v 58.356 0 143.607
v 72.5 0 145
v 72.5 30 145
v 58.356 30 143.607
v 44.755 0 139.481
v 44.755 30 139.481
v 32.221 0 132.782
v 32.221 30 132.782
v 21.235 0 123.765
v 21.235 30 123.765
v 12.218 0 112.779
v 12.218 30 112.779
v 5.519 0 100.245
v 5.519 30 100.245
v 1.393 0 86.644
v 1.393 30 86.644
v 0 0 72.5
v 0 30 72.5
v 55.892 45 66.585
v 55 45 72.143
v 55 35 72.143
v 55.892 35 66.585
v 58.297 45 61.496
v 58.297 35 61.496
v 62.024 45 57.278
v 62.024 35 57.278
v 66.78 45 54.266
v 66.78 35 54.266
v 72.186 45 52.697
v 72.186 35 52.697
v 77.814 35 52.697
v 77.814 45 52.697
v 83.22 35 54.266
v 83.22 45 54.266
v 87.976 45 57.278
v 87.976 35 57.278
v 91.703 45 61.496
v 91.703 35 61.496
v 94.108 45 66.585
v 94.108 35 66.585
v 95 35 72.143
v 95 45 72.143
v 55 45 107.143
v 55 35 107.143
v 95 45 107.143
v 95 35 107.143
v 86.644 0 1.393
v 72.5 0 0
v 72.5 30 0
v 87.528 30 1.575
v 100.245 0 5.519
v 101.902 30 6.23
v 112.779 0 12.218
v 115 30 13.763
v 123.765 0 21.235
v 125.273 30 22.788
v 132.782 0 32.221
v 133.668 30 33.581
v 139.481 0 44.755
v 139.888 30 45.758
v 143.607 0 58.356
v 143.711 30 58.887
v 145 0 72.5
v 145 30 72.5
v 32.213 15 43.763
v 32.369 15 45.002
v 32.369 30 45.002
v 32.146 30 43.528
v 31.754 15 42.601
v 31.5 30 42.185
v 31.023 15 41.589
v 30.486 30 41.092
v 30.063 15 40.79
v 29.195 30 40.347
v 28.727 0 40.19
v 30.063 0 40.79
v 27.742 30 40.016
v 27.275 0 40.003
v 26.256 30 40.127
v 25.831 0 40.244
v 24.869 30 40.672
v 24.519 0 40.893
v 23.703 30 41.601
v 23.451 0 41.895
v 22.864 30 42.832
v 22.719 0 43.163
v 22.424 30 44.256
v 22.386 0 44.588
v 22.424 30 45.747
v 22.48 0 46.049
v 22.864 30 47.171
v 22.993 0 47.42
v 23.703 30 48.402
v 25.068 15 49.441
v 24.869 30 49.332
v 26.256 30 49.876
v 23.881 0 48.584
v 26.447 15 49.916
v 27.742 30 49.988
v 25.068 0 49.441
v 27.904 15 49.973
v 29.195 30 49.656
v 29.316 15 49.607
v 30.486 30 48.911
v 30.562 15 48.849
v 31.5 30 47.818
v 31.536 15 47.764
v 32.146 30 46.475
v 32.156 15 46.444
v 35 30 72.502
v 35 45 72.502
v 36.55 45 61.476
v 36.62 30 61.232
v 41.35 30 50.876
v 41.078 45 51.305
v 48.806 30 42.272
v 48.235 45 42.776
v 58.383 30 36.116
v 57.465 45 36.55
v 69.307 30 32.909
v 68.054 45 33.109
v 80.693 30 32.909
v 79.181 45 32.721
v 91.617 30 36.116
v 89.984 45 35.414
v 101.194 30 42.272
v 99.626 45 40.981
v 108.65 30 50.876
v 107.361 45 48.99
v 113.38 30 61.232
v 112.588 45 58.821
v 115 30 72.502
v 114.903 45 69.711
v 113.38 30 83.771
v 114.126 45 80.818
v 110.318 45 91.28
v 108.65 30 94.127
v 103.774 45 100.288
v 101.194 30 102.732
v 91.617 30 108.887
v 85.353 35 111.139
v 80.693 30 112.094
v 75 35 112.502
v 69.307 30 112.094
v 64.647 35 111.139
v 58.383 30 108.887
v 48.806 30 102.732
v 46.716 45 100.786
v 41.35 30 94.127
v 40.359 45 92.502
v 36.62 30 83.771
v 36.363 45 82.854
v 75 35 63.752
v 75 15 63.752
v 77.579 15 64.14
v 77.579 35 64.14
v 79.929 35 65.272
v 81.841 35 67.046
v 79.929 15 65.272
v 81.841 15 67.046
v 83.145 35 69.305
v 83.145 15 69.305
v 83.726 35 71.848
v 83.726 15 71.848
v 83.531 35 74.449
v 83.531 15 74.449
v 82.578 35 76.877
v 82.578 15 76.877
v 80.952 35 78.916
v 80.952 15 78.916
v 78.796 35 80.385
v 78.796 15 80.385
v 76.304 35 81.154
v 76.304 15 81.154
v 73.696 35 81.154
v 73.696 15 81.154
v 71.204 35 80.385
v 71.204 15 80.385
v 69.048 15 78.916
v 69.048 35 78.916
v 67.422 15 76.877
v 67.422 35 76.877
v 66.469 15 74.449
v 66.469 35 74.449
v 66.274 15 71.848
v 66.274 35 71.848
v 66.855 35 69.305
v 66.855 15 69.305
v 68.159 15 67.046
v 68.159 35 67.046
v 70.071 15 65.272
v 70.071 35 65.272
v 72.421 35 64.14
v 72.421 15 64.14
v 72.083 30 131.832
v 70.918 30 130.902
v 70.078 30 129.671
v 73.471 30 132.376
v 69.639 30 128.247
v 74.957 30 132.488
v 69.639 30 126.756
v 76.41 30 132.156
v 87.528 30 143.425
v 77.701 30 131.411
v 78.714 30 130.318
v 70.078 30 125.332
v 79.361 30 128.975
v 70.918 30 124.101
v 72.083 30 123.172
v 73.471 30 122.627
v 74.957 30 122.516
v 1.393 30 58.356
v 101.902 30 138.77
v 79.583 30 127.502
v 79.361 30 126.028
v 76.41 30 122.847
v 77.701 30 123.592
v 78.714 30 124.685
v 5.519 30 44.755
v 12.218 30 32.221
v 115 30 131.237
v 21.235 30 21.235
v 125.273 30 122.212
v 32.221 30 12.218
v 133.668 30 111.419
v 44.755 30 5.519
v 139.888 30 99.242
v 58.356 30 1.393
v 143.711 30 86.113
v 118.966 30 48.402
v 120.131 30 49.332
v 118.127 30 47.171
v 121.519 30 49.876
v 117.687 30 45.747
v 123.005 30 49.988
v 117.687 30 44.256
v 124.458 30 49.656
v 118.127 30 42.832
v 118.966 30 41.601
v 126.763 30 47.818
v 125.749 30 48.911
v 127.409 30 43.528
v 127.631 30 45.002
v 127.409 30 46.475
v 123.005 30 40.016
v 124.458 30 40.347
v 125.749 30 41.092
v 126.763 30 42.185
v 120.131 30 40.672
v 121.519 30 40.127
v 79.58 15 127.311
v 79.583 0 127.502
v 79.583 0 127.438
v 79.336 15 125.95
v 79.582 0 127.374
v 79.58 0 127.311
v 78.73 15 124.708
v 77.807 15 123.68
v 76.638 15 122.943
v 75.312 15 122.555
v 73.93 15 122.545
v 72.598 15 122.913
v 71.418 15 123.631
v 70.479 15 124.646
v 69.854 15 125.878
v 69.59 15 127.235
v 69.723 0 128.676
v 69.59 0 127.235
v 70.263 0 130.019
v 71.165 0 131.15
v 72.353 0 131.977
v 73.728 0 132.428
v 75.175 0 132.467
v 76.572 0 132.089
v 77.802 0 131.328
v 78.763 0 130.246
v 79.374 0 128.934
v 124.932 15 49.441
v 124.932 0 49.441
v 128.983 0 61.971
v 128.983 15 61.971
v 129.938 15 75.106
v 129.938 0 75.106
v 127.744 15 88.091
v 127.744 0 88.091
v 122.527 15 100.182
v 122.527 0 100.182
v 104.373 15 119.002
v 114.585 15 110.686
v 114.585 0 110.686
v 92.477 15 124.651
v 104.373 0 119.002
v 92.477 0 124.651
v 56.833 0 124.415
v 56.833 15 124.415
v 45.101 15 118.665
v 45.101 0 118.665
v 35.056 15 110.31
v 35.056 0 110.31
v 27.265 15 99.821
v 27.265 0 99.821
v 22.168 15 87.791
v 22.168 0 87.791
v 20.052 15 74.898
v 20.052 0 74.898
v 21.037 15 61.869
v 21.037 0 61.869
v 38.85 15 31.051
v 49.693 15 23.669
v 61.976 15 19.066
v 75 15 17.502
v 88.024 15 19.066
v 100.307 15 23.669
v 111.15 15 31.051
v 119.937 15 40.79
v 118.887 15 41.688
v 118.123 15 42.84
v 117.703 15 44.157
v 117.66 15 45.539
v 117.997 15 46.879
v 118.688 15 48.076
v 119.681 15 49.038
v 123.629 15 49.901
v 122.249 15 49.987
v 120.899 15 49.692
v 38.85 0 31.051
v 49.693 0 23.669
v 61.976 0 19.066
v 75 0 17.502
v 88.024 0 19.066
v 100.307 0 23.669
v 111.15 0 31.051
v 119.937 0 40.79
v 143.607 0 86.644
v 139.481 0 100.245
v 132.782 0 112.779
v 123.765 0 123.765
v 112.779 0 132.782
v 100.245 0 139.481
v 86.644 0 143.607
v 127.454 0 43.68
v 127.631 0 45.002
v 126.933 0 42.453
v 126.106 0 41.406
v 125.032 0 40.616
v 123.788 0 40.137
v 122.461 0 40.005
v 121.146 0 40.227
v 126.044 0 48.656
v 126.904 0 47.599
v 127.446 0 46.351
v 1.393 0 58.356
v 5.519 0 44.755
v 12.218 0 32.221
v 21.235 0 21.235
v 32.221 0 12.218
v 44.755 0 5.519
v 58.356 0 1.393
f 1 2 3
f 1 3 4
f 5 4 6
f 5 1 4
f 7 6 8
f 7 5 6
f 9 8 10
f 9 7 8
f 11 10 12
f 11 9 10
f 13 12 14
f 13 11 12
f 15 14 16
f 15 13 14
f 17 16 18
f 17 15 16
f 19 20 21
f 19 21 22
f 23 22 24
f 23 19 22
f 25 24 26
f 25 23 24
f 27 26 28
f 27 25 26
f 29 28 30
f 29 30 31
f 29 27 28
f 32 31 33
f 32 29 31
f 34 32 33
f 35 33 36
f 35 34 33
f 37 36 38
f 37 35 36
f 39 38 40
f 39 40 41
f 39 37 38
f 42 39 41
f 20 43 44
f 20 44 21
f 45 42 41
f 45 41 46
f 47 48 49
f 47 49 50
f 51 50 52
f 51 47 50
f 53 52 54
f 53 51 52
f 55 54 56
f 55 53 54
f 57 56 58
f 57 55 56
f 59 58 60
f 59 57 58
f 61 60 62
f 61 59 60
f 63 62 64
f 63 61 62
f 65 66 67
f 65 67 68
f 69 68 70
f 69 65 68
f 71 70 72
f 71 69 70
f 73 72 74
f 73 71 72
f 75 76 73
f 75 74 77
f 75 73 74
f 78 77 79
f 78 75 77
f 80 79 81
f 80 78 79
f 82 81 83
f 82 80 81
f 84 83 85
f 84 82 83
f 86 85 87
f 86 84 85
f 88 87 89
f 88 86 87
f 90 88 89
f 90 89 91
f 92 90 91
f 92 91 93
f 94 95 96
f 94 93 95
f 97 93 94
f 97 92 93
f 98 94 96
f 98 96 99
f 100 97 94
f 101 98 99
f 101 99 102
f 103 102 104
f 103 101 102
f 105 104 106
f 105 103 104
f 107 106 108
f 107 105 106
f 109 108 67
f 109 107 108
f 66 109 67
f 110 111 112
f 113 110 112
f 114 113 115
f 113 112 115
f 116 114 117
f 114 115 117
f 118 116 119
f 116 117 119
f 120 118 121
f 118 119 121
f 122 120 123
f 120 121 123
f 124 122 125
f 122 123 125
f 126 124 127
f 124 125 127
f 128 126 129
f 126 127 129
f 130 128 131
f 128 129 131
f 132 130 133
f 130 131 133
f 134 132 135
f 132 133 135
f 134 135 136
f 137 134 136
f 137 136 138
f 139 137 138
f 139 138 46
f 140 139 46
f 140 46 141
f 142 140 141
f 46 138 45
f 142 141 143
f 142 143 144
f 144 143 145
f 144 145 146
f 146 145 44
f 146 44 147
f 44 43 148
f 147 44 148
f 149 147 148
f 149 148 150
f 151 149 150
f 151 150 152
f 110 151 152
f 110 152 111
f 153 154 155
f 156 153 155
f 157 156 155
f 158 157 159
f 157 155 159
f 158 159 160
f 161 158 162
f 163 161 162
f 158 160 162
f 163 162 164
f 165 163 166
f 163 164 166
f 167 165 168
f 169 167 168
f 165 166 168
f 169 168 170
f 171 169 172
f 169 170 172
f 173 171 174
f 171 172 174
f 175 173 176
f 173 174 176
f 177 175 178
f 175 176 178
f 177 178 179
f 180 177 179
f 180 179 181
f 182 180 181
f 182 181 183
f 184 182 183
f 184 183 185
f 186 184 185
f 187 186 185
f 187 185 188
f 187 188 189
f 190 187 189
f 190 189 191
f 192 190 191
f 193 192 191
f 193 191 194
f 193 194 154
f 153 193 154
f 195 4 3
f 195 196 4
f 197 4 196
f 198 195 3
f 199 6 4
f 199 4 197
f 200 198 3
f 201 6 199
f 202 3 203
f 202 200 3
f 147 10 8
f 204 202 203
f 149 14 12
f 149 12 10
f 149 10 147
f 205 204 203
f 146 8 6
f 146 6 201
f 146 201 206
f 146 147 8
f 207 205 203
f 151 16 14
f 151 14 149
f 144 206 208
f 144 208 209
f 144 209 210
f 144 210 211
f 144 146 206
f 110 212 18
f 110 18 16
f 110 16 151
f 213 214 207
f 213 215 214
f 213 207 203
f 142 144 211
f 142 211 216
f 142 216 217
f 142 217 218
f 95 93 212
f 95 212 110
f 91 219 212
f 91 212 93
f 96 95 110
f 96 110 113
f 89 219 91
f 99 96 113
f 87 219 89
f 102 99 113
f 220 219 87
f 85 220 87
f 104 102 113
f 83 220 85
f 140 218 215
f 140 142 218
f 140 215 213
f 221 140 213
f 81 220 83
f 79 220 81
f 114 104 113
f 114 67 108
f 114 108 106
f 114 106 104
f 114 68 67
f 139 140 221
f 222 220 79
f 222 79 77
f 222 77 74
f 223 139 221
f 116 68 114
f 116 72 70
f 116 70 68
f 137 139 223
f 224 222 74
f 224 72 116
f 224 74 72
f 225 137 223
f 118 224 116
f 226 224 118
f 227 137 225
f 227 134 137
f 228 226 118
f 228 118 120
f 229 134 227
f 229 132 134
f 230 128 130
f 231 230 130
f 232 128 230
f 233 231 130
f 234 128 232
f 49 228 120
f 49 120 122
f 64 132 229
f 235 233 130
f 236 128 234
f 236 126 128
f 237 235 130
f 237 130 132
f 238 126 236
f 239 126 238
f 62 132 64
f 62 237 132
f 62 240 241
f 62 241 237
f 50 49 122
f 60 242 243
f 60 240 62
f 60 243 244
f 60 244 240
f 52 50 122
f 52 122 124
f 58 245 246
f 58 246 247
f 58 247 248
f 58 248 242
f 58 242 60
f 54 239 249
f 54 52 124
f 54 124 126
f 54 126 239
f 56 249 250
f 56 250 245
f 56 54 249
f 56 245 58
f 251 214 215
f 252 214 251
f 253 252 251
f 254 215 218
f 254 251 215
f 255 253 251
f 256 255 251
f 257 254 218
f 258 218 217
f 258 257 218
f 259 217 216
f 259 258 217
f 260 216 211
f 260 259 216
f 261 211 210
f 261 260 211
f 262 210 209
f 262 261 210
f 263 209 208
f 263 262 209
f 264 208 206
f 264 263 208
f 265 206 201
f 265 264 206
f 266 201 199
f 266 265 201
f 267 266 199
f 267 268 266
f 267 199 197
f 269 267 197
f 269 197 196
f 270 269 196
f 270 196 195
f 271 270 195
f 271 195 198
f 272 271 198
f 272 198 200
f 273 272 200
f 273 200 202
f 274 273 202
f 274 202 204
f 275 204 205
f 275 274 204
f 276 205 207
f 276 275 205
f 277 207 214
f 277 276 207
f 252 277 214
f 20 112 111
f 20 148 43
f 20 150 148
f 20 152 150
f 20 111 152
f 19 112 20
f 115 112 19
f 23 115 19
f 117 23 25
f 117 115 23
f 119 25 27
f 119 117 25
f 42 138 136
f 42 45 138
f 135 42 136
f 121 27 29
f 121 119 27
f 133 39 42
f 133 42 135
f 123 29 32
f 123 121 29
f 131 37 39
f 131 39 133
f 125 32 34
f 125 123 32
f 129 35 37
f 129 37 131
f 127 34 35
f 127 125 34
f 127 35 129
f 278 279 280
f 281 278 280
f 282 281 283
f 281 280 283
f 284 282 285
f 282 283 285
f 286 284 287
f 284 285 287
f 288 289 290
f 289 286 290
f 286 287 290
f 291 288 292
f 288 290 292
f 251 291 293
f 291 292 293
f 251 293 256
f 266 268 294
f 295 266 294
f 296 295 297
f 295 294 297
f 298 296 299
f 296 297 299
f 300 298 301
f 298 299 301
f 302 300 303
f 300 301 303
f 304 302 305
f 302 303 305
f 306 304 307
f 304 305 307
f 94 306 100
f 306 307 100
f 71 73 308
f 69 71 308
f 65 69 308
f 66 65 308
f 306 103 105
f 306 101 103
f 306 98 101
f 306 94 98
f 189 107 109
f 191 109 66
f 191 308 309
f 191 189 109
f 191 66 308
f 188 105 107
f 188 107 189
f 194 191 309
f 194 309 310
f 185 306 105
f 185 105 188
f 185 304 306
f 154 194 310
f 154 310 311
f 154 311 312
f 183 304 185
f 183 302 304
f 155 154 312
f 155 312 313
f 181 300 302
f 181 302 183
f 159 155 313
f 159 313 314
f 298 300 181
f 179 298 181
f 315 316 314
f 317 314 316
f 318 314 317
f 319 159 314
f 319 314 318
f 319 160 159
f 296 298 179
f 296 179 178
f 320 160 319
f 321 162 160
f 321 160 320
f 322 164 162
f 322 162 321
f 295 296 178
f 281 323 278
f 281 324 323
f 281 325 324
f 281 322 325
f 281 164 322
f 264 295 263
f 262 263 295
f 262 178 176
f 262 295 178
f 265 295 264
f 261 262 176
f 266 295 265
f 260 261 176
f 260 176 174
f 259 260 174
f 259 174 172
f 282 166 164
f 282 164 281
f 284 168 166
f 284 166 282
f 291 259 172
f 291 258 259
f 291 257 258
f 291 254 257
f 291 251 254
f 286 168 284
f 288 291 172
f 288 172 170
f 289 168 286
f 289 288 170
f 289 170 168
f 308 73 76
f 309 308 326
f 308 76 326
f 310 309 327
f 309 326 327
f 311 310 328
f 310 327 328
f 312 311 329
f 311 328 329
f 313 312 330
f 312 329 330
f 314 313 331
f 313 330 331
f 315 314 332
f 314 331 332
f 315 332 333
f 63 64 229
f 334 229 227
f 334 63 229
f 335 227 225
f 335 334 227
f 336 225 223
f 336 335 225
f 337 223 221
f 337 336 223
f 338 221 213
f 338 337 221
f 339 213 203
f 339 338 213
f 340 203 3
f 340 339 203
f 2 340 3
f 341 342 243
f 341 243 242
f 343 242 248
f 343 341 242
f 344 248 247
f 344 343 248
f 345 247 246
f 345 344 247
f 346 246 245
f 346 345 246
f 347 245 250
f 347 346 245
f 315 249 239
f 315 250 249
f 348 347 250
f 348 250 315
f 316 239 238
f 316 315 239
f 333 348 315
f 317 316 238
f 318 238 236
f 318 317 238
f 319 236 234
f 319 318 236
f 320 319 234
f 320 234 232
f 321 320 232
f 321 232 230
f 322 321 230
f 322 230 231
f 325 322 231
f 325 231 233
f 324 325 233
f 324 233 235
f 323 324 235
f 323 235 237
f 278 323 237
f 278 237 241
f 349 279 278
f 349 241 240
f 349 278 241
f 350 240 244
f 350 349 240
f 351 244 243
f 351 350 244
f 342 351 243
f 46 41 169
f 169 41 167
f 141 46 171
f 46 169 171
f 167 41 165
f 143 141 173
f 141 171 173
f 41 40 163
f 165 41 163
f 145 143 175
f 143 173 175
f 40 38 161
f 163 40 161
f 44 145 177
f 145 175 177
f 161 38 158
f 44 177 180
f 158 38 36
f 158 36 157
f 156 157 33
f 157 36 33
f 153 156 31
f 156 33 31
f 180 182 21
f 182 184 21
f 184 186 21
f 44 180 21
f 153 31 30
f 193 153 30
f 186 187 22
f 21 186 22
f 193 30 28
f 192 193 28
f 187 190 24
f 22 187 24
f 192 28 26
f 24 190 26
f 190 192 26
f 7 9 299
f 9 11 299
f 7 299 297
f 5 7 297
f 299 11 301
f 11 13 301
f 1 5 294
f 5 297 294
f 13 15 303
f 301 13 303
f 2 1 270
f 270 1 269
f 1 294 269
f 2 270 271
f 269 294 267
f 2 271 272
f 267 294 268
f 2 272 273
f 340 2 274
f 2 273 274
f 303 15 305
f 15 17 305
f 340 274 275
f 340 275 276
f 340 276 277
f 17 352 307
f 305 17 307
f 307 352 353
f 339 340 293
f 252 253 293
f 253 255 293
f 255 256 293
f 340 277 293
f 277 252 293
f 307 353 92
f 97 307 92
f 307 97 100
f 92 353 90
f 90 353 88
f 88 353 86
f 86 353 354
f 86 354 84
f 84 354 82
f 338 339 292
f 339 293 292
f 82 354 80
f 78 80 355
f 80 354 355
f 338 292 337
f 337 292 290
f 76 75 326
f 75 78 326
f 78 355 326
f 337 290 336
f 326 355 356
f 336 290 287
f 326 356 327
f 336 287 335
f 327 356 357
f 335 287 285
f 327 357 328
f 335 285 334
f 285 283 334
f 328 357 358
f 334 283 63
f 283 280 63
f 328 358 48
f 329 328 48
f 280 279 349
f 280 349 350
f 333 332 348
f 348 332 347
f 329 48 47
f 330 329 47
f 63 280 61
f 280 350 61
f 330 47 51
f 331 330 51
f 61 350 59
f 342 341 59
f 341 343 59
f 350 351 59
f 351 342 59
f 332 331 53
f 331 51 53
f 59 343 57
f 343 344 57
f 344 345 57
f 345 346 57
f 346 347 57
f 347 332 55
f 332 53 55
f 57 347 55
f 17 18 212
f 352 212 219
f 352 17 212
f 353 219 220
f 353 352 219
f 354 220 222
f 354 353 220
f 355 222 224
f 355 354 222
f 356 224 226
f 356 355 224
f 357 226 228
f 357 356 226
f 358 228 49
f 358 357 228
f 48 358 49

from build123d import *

# Parameters (mm, degrees)
SKETCH1_W              = 150
SKETCH1_H              = 30
SKETCH1_W_2            = 80
SKETCH1_H_2            = 15
BOSS_EXTRUDE1_DEPTH    = 145
CUT_EXTRUDE1_DEPTH     = 145
CUT_EXTRUDE2_DEPTH     = 15
CUT_EXTRUDE3_DEPTH     = 10
M20_TAPPED_HOLE1_D     = 17.5
M20_TAPPED_HOLE1_DEPTH = 40
M20_TAPPED_HOLE1_TIP   = 5.257530416
SKETCH7_R              = 5
CUT_EXTRUDE4_DEPTH     = 83
SKETCH8_R              = 55
CUT_EXTRUDE5_DEPTH     = 15


with BuildPart() as part:
    # Sketch1 → Boss-Extrude1 (new body)
    with BuildSketch(Plane.XY):
        with Locations((75, 15)):
            Rectangle(SKETCH1_W, SKETCH1_H)
        with Locations((75, 37.5)):
            Rectangle(SKETCH1_W_2, SKETCH1_H_2)
    extrude(amount=BOSS_EXTRUDE1_DEPTH)

    # Sketch2 → Cut-Extrude1 (cut)
    with BuildSketch(Plane(origin=(0, 0, 0), x_dir=(1, 0, 0), z_dir=(0, 1, 0))):
        with BuildLine():
            Line((72.5, 0), (0, 0))
            Line((0, 0), (0, -72.5))
            ThreePointArc((0, -72.5), (21.234758364, -21.234758364), (72.5, 0))
        make_face()
        with BuildLine():
            ThreePointArc((72.5, -145), (21.234758364, -123.765241636), (0, -72.5))
            Line((0, -72.5), (0, -145))
            Line((0, -145), (72.5, -145))
        make_face()
        with BuildLine():
            Line((150, 0), (72.5, 0))
            ThreePointArc((72.5, 0), (123.765241636, -21.234758364), (145, -72.5))
            ThreePointArc((145, -72.5), (123.765241636, -123.765241636), (72.5, -145))
            Line((72.5, -145), (150, -145))
            Line((150, -145), (150, 0))
        make_face()
    extrude(amount=CUT_EXTRUDE1_DEPTH, mode=Mode.SUBTRACT)

    # Sketch3 → Cut-Extrude2 (cut)
    with BuildSketch(Plane(origin=(0, 45, 0), x_dir=(1, 0, 0), z_dir=(0, 1, 0))):
        with BuildLine():
            ThreePointArc((115, -13.763299378), (75.498630618, -0.062038858), (35, -10.45163177))
            Line((35, -10.45163177), (35, -72.50163177))
            ThreePointArc((35, -72.50163177), (75, -32.50163177), (115, -72.50163177))
            Line((115, -72.50163177), (115, -13.763299378))
        make_face()
        with BuildLine():
            ThreePointArc((115, -72.50163177), (75, -112.50163177), (35, -72.50163177))
            Line((35, -72.50163177), (35, -134.54836823))
            ThreePointArc((35, -134.54836823), (75.498630618, -144.937961142), (115, -131.236700622))
            Line((115, -131.236700622), (115, -72.50163177))
        make_face()
    extrude(amount=-CUT_EXTRUDE2_DEPTH, mode=Mode.SUBTRACT)

    # Sketch4 → Cut-Extrude3 (cut)
    with BuildSketch(Plane(origin=(0, 45, 0), x_dir=(1, 0, 0), z_dir=(0, 1, 0))):
        with BuildLine():
            Line((55, -107.142647921), (55, -72.142647921))
            ThreePointArc((55, -72.142647921), (75, -52.498410294), (95, -72.142647921))
            Line((95, -72.142647921), (95, -107.142647921))
            ThreePointArc((95, -107.142647921), (75, -112.50163177), (55, -107.142647921))
        make_face()
    extrude(amount=-CUT_EXTRUDE3_DEPTH, mode=Mode.SUBTRACT)

    # M20 Tapped Hole1
    with Locations(Plane(origin=(75, 35, 72.50163177), x_dir=(0, 0, 1), z_dir=(0, 1, 0))):
        with Locations((0, 0)):
            Hole(M20_TAPPED_HOLE1_D / 2, depth=M20_TAPPED_HOLE1_DEPTH)
            with Locations((0, 0, -(M20_TAPPED_HOLE1_DEPTH + M20_TAPPED_HOLE1_TIP / 2))):  # 118° drill point
                Cone(0, M20_TAPPED_HOLE1_D / 2, M20_TAPPED_HOLE1_TIP, mode=Mode.SUBTRACT)

    # Sketch7 → Cut-Extrude4 (cut)
    with BuildSketch(Plane(origin=(0, 0, 0), x_dir=(1, 0, 0), z_dir=(0, 1, 0))):
        with Locations((74.583225581, -127.50163177)):
            Circle(SKETCH7_R)
        with Locations((27.368602792, -45.00163177)):
            Circle(SKETCH7_R)
        with Locations((122.631397208, -45.00163177)):
            Circle(SKETCH7_R)
    extrude(amount=CUT_EXTRUDE4_DEPTH, mode=Mode.SUBTRACT)

    # Sketch8 → Cut-Extrude5 (cut)
    with BuildSketch(Plane.XZ):
        with Locations((75, 72.50163177)):
            Circle(SKETCH8_R)
    extrude(amount=-CUT_EXTRUDE5_DEPTH, mode=Mode.SUBTRACT)


solid = part.part
